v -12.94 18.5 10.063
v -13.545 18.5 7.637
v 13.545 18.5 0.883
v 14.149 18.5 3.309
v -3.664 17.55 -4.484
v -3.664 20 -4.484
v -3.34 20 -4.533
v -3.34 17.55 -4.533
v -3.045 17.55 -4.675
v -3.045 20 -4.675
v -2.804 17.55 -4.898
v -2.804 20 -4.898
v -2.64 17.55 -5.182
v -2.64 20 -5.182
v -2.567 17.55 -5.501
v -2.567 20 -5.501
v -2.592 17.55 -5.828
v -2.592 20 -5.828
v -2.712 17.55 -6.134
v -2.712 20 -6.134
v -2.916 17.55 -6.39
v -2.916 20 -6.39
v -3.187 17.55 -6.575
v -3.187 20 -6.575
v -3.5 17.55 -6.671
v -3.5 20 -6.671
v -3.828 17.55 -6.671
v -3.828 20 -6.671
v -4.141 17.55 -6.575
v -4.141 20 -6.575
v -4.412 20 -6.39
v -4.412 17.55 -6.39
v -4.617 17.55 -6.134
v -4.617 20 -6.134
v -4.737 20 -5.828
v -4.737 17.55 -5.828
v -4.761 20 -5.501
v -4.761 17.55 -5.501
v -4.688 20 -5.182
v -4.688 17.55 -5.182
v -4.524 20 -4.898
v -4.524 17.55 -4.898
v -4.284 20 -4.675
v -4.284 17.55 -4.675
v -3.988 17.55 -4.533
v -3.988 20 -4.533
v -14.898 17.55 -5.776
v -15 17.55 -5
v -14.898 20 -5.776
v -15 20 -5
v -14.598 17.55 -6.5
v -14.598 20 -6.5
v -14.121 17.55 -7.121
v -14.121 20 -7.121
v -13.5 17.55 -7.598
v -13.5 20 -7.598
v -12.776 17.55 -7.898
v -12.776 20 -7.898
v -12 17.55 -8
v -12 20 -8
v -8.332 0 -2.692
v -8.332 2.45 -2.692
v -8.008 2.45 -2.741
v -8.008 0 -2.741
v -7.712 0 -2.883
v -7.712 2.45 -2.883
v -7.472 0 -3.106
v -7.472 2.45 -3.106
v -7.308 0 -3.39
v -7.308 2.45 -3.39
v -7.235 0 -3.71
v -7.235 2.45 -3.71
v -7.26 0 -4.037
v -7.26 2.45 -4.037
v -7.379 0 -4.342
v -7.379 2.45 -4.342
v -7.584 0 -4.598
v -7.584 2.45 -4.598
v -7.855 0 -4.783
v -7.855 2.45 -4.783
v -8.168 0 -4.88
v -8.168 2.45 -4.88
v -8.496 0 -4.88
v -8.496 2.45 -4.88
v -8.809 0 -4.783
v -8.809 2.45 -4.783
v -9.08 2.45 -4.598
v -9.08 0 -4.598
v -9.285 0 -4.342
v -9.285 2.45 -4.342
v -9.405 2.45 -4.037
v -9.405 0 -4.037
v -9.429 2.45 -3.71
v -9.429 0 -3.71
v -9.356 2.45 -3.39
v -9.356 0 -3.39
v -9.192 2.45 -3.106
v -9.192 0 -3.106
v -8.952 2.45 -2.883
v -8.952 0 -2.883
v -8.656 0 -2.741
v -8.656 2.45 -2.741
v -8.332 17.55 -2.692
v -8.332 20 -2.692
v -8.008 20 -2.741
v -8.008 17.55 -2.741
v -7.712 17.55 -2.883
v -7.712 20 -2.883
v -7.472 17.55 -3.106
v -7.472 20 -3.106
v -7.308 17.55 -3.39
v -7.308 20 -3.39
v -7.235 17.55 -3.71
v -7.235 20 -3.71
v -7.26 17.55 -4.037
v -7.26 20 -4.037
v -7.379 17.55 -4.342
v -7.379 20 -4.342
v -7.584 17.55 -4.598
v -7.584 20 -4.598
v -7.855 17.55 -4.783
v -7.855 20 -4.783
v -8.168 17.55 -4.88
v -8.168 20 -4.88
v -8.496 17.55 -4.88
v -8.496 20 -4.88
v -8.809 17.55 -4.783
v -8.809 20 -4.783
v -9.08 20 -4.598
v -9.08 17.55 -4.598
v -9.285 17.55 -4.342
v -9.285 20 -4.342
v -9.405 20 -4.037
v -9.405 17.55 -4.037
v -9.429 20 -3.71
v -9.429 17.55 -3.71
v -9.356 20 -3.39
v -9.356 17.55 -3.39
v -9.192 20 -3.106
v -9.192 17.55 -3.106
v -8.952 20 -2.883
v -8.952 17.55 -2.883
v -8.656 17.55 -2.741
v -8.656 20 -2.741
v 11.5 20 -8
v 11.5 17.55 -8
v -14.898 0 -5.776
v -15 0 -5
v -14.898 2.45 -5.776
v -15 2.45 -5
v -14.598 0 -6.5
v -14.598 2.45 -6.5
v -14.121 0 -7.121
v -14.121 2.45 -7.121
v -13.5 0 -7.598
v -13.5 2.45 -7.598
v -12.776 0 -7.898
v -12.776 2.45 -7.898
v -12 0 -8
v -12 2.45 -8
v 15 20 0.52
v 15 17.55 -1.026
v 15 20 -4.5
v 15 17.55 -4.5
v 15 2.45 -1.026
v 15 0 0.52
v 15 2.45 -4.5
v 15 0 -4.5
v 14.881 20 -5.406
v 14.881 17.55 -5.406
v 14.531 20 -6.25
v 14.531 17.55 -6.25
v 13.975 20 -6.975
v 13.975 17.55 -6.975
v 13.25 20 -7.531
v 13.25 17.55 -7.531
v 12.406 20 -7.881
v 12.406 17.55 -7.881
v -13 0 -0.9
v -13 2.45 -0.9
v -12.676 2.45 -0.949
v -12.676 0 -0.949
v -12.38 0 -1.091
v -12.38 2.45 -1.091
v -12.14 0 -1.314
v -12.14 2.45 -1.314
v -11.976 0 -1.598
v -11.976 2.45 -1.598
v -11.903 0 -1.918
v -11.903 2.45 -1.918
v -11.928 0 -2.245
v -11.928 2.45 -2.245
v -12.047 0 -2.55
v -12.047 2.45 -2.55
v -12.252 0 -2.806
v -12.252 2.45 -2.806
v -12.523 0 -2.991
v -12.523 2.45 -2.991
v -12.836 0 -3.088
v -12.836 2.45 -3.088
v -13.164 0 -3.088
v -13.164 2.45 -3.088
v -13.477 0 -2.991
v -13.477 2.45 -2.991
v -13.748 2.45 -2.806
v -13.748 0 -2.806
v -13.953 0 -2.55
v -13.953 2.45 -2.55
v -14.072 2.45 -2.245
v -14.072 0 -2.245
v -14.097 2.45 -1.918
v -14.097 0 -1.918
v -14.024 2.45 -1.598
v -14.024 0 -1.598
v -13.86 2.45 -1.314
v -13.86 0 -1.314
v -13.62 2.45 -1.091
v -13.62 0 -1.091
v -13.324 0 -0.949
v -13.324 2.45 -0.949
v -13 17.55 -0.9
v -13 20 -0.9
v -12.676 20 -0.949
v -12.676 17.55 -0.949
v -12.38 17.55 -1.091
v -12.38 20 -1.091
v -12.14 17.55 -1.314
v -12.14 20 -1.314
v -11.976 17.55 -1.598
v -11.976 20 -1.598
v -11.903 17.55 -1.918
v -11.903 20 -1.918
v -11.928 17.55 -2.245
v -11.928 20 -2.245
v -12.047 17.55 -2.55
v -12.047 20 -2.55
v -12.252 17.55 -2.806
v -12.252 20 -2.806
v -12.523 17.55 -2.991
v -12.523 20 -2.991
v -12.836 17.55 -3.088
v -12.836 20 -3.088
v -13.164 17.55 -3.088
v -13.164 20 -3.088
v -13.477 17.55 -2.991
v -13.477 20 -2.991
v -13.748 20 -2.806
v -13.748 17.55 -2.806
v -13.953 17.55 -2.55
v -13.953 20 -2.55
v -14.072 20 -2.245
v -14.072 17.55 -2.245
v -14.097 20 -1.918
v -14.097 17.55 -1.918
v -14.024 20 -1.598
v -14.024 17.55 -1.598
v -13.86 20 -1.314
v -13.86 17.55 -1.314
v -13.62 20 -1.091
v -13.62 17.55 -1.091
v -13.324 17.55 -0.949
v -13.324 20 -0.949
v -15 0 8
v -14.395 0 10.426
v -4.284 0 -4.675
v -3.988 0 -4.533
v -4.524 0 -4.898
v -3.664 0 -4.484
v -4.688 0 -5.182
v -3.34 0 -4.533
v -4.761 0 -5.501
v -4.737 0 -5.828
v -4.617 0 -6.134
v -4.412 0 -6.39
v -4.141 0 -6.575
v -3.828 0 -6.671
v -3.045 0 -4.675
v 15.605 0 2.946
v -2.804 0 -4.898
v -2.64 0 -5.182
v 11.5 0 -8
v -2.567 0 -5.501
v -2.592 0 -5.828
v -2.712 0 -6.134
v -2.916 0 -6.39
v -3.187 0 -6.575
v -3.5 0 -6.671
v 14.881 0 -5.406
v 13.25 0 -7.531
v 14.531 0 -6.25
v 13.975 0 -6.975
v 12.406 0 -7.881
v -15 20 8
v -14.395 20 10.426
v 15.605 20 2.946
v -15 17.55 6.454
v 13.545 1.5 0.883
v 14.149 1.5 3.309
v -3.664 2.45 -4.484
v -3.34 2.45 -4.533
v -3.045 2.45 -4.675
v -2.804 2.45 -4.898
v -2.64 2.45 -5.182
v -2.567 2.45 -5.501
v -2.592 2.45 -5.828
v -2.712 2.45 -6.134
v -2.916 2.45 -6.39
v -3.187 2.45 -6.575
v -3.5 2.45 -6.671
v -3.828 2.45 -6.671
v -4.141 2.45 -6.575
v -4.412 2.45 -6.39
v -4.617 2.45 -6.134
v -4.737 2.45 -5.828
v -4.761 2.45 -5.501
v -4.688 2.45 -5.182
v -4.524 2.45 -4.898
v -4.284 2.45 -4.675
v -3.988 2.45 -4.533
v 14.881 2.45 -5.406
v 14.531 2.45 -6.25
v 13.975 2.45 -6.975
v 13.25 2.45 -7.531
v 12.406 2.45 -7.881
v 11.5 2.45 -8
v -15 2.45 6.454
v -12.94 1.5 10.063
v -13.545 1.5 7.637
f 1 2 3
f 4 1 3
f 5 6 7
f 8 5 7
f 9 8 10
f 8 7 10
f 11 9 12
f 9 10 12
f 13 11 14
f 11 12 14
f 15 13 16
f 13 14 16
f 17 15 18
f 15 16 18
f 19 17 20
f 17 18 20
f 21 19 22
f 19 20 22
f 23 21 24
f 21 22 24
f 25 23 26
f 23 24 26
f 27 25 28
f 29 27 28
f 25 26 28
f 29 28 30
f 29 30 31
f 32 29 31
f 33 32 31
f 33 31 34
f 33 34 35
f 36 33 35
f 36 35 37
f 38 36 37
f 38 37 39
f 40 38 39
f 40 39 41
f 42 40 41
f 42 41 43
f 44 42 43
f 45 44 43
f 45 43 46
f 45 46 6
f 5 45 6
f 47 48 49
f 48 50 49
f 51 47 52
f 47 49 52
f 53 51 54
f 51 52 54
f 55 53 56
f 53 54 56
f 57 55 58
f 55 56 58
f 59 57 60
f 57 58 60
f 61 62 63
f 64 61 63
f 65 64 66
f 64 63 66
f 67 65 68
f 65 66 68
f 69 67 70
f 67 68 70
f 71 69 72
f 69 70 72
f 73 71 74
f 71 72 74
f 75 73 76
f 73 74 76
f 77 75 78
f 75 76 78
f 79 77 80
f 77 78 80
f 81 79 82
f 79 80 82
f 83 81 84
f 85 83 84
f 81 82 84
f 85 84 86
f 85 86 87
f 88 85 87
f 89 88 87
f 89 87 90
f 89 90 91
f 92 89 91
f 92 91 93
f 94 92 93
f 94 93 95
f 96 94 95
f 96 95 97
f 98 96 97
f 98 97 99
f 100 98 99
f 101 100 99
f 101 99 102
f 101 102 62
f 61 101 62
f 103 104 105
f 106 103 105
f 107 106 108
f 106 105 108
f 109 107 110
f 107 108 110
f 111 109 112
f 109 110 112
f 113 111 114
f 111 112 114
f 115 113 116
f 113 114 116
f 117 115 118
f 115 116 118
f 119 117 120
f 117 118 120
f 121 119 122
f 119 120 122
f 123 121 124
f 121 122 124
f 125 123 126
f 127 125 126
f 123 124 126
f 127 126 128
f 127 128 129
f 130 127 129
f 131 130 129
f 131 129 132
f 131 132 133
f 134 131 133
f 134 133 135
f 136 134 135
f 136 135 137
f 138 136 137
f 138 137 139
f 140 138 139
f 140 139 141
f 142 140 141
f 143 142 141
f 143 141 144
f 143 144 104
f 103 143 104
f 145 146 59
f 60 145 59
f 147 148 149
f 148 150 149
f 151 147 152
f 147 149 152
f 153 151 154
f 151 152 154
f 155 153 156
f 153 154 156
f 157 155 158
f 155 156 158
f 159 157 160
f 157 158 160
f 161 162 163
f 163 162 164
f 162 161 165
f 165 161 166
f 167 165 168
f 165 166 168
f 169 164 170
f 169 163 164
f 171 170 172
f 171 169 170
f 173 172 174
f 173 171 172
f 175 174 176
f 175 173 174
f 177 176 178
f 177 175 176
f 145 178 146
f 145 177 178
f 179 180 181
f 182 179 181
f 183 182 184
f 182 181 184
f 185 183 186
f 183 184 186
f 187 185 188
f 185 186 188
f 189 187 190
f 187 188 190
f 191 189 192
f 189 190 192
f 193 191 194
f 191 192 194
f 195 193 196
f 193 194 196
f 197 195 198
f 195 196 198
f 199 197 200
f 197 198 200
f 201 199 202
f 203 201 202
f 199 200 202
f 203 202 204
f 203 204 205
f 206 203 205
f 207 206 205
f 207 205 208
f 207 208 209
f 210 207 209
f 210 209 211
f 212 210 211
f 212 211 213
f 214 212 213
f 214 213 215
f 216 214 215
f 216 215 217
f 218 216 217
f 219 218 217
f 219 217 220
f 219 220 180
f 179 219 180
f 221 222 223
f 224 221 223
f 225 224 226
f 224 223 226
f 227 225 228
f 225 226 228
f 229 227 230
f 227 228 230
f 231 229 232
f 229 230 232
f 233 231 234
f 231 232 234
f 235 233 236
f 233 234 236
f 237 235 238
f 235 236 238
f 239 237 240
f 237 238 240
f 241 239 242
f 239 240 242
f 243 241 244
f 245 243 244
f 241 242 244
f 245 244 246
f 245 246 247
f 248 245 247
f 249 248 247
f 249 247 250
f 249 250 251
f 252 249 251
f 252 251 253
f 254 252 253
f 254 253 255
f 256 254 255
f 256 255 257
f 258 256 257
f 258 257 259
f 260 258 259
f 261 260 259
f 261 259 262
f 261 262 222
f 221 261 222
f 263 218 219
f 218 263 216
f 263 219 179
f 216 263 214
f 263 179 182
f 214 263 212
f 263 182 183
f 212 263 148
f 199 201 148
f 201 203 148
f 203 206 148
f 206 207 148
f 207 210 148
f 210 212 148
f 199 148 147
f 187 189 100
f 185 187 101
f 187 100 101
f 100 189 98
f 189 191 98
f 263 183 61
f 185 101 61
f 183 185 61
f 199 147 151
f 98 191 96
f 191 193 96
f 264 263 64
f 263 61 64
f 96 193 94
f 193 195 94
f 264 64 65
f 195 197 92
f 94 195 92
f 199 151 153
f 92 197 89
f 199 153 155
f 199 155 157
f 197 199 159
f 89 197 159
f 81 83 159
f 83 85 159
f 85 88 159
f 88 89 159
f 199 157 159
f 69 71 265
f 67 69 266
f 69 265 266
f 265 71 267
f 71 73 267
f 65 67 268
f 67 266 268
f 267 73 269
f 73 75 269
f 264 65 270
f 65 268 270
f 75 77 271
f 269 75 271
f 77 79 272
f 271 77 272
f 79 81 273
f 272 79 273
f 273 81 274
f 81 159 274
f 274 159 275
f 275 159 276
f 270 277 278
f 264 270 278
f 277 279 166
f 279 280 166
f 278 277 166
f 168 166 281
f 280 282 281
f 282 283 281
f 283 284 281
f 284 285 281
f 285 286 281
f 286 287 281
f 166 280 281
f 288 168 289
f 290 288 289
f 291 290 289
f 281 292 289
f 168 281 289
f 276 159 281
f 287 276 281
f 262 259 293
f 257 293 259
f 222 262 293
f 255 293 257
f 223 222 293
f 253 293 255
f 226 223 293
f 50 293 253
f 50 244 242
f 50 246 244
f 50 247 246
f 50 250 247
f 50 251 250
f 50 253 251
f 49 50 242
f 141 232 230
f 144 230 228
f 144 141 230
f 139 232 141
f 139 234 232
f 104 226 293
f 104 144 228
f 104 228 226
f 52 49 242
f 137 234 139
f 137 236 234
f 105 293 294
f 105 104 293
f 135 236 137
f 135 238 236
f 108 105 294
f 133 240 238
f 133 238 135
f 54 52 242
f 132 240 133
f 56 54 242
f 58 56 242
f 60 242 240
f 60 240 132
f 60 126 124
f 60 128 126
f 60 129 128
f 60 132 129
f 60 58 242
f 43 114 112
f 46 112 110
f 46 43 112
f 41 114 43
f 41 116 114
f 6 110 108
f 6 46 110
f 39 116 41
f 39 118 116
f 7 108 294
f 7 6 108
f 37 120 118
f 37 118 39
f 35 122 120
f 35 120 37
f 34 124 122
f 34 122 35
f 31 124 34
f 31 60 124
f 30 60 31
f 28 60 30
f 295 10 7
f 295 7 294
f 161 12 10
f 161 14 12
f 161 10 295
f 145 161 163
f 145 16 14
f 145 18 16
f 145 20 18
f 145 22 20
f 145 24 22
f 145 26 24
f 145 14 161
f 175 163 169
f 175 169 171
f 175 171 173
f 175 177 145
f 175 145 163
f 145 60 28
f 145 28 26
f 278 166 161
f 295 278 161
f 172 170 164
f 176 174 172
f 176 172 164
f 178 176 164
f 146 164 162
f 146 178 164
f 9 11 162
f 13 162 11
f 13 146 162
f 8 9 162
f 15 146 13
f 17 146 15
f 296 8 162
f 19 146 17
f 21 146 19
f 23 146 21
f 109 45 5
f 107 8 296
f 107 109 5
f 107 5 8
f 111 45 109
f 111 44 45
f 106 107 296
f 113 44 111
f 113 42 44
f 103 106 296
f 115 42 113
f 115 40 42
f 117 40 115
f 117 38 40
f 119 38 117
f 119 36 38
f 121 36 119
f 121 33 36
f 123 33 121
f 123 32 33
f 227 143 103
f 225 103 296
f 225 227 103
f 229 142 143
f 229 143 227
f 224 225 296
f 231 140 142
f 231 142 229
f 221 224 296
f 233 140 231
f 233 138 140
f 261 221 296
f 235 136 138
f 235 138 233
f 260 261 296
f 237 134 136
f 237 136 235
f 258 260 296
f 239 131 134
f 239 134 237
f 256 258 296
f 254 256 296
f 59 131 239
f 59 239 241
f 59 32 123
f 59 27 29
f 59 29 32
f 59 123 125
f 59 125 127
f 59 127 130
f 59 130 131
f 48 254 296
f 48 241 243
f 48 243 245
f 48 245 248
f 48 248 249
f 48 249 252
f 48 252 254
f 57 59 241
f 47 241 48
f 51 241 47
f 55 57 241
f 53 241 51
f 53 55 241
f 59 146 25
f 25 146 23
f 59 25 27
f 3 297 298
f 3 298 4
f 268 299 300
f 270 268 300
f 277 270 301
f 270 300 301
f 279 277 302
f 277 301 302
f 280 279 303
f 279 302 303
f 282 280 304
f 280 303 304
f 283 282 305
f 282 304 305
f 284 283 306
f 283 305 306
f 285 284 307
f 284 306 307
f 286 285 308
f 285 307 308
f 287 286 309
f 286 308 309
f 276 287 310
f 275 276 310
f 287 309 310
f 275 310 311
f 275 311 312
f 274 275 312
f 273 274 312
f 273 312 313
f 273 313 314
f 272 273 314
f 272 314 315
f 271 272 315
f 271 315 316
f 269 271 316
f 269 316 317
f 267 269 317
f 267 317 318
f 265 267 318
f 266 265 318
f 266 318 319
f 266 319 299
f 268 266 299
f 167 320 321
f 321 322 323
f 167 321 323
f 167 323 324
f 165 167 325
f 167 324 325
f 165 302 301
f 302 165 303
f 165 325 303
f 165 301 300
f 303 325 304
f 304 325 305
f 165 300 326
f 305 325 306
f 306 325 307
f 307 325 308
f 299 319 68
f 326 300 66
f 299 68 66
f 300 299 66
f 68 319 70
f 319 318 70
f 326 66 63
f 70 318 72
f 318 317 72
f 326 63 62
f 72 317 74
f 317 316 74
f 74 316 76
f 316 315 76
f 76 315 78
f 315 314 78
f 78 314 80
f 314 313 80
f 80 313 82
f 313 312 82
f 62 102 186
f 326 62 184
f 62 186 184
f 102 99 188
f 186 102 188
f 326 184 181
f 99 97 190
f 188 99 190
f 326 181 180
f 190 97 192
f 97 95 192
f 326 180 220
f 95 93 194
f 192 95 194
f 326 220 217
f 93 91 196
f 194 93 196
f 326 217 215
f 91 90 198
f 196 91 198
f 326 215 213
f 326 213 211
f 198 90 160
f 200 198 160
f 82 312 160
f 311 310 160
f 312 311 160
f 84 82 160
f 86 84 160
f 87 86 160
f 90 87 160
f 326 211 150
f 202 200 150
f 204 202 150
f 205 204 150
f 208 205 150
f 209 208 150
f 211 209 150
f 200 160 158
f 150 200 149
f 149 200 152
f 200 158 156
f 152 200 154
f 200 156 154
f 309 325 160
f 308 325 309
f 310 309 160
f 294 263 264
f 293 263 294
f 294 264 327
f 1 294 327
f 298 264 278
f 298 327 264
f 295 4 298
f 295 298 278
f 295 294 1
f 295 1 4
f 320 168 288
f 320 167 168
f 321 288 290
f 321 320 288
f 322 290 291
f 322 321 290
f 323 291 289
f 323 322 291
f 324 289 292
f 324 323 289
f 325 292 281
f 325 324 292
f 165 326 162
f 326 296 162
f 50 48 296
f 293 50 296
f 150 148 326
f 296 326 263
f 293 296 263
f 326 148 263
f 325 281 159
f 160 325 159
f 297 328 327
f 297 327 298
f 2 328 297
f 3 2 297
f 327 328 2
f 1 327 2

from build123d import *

# Parameters (mm, degrees)
EXTRUDE_1_DEPTH     = 20
SKETCH_2_R          = 1.1
CUT_EXTRUDE_2_DEPTH = 27.248809497
CUT_EXTRUDE_3_REACH = 31.682
SKETCH_3_W          = 30
SKETCH_3_H          = 15.1
FILLET_1_R          = 3
SKETCH_6_W          = 30.918408881
SKETCH_6_H          = 20
SKETCH_6_W_2        = 27.918408881
SKETCH_6_H_2        = 17
EXTRUDE_2_DEPTH     = 2.5
FILLET_2_R          = 3.5


with BuildPart() as part:
    # 草图1 → 凸台-拉伸1 (new body)
    with BuildSketch(Plane(origin=(0, 0, 0), x_dir=(1, 0, 0), z_dir=(0, 1, 0))):
        Polygon((-15, -8), (15, -0.520159915), (15, 8), (-15, 8), align=None)
    extrude(amount=EXTRUDE_1_DEPTH)

    # 草图2 → 切除-拉伸2 (cut, through all)
    with BuildSketch(Plane(origin=(0, 20, 0), x_dir=(1, 0, 0), z_dir=(0, 1, 0))):
        with Locations(Location((-13, 2, 0), (0, 0, 270))):
            Circle(SKETCH_2_R)
        with Locations(Location((-8.332097868, 3.791839748, 0), (0, 0, 270))):
            Circle(SKETCH_2_R)
        with Locations(Location((-3.664195735, 5.583679495, 0), (0, 0, 270))):
            Circle(SKETCH_2_R)
    extrude(amount=-CUT_EXTRUDE_2_DEPTH, mode=Mode.SUBTRACT)

    # 切除-拉伸3: up to this plane
    cut_extrude_3_end = Plane(origin=(0.637110354, 0, 2.555310061), z_dir=(0.24192189559966876, 0, 0.9702957262759963))
    # 草图3 → 切除-拉伸3 (cut, up to the surface)
    with BuildSketch(Plane(origin=(0, 0, -8), x_dir=(-1, 0, 0), z_dir=(0, 0, -1)), mode=Mode.PRIVATE) as cut_extrude_3_sk1:
        with Locations((0, 10)):
            Rectangle(SKETCH_3_W, SKETCH_3_H)
    cut_extrude_3_tool1 = split(extrude(cut_extrude_3_sk1.sketch, amount=-CUT_EXTRUDE_3_REACH, mode=Mode.PRIVATE), bisect_by=cut_extrude_3_end, keep=Keep.BOTH, mode=Mode.PRIVATE)
    add(cut_extrude_3_tool1.solids().sort_by_distance((0, 10, -8))[0], mode=Mode.SUBTRACT)

    # 圆角1
    fillet_1_edges = [part.edges().sort_by_distance(p)[0] for p in [
        (-15, 1.225, -8),
        (-15, 18.775, -8),
    ]]
    fillet(fillet_1_edges, radius=FILLET_1_R)

    # 草图6 → 凸台-拉伸2 (add)
    with BuildSketch(Plane(origin=(0.999993198, 0, 4.010753651), x_dir=(0.9702957262759964, 0, -0.2419218955996687), z_dir=(0.2419218955996687, 0, 0.9702957262759964))):
        with Locations((-1.030606619, 10)):
            Rectangle(SKETCH_6_W, SKETCH_6_H)
        with Locations((-1.030606619, 10)):
            Rectangle(SKETCH_6_W_2, SKETCH_6_H_2, mode=Mode.SUBTRACT)
    extrude(amount=EXTRUDE_2_DEPTH)

    # 圆角2
    fillet_2_edges = [part.edges().sort_by_distance(p)[0] for p in [
        (15, 1.225, -8),
        (15, 18.775, -8),
    ]]
    fillet(fillet_2_edges, radius=FILLET_2_R)


solid = part.part
